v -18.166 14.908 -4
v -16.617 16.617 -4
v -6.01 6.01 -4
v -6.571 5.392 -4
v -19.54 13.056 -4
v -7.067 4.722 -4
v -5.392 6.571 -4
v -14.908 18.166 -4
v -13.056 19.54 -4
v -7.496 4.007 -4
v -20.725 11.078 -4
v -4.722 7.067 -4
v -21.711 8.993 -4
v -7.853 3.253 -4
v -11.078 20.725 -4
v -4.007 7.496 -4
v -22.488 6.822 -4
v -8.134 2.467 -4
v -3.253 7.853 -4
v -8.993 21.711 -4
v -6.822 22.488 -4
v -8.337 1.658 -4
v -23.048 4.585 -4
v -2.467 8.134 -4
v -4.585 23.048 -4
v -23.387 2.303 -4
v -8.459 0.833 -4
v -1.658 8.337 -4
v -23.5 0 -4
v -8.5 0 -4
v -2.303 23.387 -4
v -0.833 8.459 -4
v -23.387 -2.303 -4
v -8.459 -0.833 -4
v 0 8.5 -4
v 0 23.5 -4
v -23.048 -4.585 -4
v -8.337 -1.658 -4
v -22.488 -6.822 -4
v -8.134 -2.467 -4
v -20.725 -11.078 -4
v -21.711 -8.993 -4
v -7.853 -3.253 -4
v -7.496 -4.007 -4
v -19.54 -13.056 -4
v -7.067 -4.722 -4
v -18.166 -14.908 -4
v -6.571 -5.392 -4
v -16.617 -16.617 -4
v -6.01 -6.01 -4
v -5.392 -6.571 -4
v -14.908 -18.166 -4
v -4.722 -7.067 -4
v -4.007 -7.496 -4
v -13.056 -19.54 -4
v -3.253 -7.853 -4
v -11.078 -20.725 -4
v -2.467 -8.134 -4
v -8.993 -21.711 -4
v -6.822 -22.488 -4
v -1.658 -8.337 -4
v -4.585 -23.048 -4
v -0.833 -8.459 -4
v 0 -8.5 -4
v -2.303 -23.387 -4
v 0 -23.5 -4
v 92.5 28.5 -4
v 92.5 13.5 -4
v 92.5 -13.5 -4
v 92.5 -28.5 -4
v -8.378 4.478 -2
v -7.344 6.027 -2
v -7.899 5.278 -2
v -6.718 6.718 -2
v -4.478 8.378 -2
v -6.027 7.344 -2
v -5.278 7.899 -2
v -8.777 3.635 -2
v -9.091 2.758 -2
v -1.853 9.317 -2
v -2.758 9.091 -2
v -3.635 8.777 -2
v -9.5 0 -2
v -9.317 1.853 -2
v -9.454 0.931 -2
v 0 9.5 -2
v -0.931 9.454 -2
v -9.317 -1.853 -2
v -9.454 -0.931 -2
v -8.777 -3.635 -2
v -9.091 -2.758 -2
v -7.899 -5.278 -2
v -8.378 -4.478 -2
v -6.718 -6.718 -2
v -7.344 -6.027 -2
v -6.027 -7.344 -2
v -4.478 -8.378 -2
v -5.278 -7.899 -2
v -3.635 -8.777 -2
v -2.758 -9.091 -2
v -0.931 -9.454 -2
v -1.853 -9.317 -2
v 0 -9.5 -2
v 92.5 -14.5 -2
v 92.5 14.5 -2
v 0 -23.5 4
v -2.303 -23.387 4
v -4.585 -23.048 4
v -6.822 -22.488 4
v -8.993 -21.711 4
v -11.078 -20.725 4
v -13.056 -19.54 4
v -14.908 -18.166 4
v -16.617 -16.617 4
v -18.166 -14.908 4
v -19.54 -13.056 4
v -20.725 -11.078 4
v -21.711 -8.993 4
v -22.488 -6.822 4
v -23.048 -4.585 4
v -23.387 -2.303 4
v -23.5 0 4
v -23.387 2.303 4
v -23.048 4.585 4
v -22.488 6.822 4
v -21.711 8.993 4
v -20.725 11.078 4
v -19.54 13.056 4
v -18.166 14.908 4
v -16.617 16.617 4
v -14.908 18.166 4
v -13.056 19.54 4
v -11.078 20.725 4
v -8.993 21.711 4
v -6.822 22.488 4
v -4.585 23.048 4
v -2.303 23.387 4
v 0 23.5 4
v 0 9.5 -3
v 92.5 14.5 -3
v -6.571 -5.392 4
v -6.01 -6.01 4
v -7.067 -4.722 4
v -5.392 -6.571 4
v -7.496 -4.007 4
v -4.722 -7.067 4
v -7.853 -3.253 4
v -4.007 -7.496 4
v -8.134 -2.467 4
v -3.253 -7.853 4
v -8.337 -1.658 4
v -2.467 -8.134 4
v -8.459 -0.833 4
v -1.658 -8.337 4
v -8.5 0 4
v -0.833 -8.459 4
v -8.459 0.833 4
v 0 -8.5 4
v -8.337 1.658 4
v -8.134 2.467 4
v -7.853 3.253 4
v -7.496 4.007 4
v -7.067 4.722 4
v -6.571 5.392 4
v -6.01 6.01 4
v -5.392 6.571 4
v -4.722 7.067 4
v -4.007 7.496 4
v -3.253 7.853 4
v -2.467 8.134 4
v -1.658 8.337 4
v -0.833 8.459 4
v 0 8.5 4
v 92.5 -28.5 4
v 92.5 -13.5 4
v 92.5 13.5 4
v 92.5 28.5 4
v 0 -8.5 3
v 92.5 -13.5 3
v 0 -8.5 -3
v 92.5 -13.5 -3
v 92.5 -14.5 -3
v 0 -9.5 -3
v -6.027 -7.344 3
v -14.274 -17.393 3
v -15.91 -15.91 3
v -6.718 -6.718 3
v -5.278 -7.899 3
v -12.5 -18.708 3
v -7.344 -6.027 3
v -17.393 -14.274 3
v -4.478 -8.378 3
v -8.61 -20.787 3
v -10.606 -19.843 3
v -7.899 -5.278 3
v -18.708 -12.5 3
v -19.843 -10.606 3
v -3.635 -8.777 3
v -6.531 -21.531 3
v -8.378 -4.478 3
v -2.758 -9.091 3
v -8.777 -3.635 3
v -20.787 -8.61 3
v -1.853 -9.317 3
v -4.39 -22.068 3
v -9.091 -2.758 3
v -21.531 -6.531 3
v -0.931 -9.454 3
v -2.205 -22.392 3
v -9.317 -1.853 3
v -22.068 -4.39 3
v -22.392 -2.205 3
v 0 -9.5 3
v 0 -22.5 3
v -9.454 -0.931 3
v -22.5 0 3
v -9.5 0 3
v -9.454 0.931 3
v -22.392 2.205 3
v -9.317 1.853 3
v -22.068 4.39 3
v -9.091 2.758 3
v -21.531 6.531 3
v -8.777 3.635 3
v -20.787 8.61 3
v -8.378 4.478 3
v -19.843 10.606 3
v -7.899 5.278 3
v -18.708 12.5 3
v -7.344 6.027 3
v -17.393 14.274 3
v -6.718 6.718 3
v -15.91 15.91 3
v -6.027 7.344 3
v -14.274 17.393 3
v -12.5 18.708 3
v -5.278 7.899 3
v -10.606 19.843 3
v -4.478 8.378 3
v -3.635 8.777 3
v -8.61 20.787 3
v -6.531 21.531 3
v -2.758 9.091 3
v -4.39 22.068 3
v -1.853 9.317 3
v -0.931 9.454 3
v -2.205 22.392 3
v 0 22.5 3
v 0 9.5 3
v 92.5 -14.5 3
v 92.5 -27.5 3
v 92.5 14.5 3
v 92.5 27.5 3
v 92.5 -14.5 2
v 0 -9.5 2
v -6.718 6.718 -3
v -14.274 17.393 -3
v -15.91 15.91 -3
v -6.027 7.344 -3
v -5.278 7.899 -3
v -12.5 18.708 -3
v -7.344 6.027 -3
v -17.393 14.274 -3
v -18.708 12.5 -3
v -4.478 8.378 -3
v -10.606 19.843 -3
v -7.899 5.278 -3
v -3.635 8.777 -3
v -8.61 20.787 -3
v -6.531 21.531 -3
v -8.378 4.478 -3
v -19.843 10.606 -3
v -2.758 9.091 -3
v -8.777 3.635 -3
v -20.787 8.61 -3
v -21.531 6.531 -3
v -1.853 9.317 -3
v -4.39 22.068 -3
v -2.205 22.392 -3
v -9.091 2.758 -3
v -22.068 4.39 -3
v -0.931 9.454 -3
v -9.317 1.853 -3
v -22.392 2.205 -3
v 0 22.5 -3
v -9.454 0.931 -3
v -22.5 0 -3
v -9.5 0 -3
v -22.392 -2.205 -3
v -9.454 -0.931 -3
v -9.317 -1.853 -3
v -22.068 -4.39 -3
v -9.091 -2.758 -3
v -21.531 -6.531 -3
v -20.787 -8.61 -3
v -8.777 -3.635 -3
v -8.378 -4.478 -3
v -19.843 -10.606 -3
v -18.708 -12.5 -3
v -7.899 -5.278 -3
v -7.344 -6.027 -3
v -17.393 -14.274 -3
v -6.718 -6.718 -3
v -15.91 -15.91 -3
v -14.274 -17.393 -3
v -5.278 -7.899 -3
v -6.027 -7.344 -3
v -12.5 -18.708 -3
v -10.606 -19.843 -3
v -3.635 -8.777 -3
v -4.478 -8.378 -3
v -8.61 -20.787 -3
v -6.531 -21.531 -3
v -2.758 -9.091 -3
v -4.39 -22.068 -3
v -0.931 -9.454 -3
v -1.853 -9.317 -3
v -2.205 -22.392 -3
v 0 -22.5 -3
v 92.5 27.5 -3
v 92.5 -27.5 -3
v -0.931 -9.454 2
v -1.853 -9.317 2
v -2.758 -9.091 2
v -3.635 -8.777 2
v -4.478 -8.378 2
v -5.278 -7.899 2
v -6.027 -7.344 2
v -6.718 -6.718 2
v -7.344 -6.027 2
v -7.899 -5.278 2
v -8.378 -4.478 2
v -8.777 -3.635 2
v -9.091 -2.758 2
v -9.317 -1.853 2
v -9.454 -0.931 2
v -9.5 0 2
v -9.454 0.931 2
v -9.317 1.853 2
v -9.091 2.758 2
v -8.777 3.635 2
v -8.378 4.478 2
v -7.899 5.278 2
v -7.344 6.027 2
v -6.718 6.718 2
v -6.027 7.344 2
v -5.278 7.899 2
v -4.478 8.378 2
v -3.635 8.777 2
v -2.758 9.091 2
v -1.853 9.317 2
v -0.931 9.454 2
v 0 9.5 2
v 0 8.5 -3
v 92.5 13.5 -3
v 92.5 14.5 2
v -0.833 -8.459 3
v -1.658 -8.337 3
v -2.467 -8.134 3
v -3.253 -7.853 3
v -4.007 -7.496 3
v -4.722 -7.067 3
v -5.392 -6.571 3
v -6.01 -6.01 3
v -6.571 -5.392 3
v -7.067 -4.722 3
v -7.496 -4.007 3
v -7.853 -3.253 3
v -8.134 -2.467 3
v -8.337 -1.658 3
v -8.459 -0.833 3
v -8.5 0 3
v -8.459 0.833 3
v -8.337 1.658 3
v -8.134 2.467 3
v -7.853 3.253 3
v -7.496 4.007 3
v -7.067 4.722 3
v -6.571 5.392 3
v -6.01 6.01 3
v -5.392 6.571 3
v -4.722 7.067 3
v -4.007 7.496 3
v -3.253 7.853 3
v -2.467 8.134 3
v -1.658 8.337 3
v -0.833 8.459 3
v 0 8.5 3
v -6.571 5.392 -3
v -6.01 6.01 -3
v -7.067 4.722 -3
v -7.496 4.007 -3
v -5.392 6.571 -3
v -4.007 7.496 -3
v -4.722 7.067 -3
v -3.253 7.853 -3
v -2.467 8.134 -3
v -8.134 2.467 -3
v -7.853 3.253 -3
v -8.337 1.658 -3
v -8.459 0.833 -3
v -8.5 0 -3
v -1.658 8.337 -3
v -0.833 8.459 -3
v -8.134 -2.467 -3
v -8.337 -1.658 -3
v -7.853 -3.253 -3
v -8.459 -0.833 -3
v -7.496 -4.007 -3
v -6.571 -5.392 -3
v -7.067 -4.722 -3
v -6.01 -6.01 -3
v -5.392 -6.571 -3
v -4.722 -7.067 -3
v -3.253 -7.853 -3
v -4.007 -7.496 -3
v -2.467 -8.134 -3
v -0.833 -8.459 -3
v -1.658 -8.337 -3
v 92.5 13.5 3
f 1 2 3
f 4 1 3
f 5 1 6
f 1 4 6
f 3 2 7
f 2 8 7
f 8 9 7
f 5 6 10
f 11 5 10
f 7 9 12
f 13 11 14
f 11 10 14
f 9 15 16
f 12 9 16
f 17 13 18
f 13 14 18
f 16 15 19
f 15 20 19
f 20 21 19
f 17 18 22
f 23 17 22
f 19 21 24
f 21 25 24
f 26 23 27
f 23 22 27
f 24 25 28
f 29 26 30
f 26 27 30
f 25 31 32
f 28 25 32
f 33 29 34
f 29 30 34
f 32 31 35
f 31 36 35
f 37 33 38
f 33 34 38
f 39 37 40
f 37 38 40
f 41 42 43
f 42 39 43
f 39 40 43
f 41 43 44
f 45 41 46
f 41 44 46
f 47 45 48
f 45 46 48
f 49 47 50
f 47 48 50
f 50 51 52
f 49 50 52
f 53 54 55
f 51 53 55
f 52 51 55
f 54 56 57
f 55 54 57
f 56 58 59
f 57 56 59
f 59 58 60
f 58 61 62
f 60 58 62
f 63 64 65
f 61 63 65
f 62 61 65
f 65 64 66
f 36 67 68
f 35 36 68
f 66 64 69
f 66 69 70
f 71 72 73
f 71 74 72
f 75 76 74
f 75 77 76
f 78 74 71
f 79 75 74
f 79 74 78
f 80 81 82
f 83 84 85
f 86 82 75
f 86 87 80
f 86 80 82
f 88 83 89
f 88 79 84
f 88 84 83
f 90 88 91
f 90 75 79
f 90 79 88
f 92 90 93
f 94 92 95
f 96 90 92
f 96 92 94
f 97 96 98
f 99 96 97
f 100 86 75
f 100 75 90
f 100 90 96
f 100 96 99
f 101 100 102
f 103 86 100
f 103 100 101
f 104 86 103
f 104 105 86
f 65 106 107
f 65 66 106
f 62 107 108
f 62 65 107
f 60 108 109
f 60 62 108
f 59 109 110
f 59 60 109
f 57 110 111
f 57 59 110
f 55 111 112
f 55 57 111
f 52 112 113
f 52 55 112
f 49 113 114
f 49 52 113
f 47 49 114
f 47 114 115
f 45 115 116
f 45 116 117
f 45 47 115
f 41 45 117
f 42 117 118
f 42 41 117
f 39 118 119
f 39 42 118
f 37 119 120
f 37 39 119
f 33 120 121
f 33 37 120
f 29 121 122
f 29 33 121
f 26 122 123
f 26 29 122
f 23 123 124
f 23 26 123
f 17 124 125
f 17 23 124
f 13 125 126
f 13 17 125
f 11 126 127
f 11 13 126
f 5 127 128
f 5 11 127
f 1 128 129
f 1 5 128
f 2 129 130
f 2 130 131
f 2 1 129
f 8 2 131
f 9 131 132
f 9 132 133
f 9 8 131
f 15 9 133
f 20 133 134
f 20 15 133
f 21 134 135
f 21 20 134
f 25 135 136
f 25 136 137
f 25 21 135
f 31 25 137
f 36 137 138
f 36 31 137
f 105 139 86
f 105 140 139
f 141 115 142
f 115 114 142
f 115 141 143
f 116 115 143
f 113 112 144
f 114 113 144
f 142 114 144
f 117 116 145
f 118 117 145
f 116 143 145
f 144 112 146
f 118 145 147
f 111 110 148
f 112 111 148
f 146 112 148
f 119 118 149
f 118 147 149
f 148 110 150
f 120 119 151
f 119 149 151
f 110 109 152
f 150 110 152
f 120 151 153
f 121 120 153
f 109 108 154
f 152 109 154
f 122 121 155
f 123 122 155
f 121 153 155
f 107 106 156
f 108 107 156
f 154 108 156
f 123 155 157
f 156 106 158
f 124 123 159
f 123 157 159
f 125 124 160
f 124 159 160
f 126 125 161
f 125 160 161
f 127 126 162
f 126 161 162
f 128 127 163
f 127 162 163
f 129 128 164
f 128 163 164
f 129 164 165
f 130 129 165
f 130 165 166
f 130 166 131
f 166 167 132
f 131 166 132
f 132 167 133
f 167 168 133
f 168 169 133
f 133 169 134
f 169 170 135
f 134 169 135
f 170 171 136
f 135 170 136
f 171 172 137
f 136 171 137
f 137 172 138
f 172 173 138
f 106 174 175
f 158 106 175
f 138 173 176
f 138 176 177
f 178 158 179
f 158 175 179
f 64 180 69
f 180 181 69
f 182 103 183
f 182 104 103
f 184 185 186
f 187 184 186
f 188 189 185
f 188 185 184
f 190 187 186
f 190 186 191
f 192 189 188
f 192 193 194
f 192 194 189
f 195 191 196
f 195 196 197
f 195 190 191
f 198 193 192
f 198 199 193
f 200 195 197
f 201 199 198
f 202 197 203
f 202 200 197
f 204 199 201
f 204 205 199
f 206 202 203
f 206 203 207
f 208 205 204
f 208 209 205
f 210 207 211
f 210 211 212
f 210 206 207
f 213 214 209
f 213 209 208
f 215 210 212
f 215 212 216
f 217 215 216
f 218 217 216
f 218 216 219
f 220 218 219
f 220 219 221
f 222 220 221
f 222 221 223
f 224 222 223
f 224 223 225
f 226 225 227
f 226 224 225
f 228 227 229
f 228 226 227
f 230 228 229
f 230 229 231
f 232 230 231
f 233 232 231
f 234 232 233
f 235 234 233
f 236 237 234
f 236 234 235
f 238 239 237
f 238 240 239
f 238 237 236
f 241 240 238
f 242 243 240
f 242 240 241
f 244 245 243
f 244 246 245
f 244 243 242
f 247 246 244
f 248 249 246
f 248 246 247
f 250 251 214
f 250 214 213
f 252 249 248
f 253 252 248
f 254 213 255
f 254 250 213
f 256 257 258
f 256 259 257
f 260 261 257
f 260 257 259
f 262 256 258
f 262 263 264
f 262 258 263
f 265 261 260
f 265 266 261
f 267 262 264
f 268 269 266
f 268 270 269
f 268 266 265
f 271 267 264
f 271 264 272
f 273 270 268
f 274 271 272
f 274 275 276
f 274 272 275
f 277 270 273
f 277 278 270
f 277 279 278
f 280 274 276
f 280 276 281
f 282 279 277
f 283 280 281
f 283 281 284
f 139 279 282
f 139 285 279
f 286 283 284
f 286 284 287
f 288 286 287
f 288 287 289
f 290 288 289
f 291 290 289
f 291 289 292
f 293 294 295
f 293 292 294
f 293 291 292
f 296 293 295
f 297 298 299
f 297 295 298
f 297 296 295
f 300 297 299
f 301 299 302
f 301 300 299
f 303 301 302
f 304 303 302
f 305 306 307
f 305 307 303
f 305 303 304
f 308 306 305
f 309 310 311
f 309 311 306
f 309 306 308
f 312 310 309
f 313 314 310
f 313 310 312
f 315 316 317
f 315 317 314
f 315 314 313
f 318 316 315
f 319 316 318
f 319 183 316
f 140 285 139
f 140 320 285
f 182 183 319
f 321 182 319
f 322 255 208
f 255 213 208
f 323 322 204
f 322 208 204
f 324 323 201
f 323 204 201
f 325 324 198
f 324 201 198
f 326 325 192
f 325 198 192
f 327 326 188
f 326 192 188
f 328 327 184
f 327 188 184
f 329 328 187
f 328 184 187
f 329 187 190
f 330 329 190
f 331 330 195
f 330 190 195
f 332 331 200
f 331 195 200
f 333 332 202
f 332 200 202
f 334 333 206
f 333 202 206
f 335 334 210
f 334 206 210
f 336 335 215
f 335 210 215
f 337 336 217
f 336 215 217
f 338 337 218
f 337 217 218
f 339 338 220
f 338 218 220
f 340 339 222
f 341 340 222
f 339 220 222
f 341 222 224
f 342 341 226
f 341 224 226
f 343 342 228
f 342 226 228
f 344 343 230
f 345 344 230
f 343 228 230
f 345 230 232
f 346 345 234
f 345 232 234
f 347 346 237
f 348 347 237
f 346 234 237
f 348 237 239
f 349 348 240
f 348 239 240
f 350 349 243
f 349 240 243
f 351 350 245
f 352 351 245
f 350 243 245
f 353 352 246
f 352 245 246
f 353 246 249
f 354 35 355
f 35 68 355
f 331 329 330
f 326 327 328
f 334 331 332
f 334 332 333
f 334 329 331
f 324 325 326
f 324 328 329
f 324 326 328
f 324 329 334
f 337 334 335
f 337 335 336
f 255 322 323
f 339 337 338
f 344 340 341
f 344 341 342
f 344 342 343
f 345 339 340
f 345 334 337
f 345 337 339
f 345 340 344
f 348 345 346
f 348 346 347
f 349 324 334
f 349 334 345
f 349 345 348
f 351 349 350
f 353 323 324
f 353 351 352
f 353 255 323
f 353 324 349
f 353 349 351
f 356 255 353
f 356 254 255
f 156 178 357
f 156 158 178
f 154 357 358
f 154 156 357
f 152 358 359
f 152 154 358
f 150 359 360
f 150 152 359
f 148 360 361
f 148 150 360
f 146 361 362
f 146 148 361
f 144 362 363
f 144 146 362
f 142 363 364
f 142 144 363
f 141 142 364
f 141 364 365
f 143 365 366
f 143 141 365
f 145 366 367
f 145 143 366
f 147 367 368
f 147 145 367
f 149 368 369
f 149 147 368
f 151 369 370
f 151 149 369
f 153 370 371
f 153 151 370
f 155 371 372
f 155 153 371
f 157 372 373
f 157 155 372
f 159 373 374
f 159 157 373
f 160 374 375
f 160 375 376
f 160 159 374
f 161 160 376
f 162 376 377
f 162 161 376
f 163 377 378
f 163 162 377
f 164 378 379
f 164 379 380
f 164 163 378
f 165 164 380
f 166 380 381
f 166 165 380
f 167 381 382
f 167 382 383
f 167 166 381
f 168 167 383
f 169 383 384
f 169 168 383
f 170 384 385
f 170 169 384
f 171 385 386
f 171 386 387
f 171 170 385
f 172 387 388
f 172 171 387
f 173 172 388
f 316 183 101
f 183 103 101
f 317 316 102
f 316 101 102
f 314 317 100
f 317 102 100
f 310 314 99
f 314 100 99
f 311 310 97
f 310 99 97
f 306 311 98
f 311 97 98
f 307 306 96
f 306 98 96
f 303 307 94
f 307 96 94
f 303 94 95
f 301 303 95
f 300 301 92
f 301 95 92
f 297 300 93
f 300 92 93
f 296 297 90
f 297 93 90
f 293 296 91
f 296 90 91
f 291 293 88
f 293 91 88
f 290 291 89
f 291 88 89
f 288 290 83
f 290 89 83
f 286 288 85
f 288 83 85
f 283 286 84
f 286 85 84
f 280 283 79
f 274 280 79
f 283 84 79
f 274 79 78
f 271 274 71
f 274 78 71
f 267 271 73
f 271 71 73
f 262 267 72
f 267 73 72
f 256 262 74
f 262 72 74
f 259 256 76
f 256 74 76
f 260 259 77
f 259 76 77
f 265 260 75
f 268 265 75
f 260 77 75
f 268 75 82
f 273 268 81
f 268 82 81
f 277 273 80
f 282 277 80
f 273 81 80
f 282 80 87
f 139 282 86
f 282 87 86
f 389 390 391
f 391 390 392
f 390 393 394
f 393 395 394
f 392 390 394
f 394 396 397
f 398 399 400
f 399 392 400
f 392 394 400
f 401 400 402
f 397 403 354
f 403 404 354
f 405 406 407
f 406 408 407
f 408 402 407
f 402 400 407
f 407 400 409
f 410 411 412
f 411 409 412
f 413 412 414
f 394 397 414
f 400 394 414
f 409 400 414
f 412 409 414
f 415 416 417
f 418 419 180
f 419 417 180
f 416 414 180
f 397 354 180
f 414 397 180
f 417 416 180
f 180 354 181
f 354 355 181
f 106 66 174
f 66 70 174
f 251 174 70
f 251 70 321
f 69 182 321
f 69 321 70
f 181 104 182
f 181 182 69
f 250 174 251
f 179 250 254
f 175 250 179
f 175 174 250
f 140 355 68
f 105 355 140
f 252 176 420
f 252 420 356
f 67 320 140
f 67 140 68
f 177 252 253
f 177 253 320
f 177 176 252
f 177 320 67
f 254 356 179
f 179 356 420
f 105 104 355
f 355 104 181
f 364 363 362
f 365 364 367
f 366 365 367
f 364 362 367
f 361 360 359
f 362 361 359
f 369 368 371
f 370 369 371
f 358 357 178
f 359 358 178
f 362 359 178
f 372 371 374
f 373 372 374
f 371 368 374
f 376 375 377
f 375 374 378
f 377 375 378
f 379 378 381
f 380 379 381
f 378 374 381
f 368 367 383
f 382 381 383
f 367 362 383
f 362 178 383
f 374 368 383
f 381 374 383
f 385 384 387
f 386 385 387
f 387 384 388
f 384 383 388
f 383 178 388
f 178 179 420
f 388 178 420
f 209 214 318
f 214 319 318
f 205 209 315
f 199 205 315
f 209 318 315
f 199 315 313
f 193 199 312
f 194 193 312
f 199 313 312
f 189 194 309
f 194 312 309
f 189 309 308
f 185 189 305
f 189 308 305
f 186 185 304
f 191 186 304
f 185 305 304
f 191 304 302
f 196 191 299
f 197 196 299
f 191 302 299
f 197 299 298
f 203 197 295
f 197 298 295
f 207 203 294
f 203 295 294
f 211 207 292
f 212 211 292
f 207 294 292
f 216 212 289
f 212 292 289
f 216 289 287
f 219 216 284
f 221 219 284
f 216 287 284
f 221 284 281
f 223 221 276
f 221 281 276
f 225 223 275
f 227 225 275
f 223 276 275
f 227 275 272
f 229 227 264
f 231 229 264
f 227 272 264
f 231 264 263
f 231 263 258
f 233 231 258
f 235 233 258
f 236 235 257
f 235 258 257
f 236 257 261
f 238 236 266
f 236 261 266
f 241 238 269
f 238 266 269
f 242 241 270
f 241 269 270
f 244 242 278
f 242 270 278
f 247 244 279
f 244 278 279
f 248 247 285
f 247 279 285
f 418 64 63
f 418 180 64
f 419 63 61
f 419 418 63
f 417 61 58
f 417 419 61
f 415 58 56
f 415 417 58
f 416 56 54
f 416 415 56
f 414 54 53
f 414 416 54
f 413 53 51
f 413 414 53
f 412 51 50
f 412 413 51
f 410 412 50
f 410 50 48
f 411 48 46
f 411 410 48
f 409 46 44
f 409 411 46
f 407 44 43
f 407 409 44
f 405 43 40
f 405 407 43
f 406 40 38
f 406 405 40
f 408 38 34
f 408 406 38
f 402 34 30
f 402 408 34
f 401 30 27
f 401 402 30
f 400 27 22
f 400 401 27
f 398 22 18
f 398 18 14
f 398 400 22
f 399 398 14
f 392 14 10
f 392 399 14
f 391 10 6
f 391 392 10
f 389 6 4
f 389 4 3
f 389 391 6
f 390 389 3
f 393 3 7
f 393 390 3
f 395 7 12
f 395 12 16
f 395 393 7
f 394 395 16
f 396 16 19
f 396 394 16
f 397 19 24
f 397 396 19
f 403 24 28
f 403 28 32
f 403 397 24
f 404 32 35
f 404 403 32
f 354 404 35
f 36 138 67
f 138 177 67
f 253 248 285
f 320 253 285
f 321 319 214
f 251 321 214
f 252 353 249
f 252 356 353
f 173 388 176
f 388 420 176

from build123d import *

# Parameters (mm, degrees)
REVOLUTION_ANGLE = -180
GROOVE_ANGLE     = -180


with BuildPart() as part:
    # Sketch → Revolution (revolve)
    with BuildSketch(Plane.YZ):
        Polygon((0, 3), (-8.5, 3), (-8.5, 4), (-23.5, 4), (-23.5, -4), (-8.5, -4), (-8.5, -3), (0, -3), align=None)
    revolve(axis=Axis((0, 0, 0), (0, 0, 1)), revolution_arc=REVOLUTION_ANGLE)

    # Import → Groove (revolve, cut)
    with BuildSketch(Plane(origin=(0, -11.25, 0), x_dir=(0, -1, 0), z_dir=(1, 0, 0))):
        Polygon((-11.25, -2), (-1.75, -2), (-1.75, -3), (11.25, -3), (11.25, 3), (-1.75, 3), (-1.75, 2), (-11.25, 2), align=None)
    revolve(axis=Axis((0, 0, 0), (0, 0, 1)), revolution_arc=GROOVE_ANGLE, mode=Mode.SUBTRACT)

    # Sketch002 (on Face3 of Groove) → AdditiveLoft section 0
    with BuildSketch(Plane.YZ):
        Polygon((-23.5, 4), (-8.5, 4), (-8.5, 3), (8.5, 3), (8.5, 4), (23.5, 4), (23.5, -4), (8.5, -4), (8.5, -3), (-8.5, -3), (-8.5, -4), (-23.5, -4), align=None)
    # Import001 → AdditiveLoft section 1
    with BuildSketch(Plane(origin=(92.5, 0, 0), x_dir=(0, 1, 0), z_dir=(-1, 0, 0))):
        Polygon((-28.5, -4), (-13.5, -4), (-13.5, -3), (13.5, -3), (13.5, -4), (28.5, -4), (28.5, 4), (13.5, 4), (13.5, 3), (-13.5, 3), (-13.5, 4), (-28.5, 4), align=None)
    loft()

    # Import002 → SubtractiveLoft section 0
    with BuildSketch(Plane(origin=(0, 0, 0), x_dir=(0, -1, 0), z_dir=(1, 0, 0))):
        Polygon((22.5, -3), (9.5, -3), (9.5, -2), (-9.5, -2), (-9.5, -3), (-22.5, -3), (-22.5, 3), (-9.5, 3), (-9.5, 2), (9.5, 2), (9.5, 3), (22.5, 3), align=None)
    # Import003 → SubtractiveLoft section 1
    with BuildSketch(Plane(origin=(92.5, 0, 0), x_dir=(0, 1, 0), z_dir=(-1, 0, 0))):
        Polygon((-27.5, -3), (-14.5, -3), (-14.5, -2), (14.5, -2), (14.5, -3), (27.5, -3), (27.5, 3), (14.5, 3), (14.5, 2), (-14.5, 2), (-14.5, 3), (-27.5, 3), align=None)
    loft(mode=Mode.SUBTRACT)


solid = part.part
